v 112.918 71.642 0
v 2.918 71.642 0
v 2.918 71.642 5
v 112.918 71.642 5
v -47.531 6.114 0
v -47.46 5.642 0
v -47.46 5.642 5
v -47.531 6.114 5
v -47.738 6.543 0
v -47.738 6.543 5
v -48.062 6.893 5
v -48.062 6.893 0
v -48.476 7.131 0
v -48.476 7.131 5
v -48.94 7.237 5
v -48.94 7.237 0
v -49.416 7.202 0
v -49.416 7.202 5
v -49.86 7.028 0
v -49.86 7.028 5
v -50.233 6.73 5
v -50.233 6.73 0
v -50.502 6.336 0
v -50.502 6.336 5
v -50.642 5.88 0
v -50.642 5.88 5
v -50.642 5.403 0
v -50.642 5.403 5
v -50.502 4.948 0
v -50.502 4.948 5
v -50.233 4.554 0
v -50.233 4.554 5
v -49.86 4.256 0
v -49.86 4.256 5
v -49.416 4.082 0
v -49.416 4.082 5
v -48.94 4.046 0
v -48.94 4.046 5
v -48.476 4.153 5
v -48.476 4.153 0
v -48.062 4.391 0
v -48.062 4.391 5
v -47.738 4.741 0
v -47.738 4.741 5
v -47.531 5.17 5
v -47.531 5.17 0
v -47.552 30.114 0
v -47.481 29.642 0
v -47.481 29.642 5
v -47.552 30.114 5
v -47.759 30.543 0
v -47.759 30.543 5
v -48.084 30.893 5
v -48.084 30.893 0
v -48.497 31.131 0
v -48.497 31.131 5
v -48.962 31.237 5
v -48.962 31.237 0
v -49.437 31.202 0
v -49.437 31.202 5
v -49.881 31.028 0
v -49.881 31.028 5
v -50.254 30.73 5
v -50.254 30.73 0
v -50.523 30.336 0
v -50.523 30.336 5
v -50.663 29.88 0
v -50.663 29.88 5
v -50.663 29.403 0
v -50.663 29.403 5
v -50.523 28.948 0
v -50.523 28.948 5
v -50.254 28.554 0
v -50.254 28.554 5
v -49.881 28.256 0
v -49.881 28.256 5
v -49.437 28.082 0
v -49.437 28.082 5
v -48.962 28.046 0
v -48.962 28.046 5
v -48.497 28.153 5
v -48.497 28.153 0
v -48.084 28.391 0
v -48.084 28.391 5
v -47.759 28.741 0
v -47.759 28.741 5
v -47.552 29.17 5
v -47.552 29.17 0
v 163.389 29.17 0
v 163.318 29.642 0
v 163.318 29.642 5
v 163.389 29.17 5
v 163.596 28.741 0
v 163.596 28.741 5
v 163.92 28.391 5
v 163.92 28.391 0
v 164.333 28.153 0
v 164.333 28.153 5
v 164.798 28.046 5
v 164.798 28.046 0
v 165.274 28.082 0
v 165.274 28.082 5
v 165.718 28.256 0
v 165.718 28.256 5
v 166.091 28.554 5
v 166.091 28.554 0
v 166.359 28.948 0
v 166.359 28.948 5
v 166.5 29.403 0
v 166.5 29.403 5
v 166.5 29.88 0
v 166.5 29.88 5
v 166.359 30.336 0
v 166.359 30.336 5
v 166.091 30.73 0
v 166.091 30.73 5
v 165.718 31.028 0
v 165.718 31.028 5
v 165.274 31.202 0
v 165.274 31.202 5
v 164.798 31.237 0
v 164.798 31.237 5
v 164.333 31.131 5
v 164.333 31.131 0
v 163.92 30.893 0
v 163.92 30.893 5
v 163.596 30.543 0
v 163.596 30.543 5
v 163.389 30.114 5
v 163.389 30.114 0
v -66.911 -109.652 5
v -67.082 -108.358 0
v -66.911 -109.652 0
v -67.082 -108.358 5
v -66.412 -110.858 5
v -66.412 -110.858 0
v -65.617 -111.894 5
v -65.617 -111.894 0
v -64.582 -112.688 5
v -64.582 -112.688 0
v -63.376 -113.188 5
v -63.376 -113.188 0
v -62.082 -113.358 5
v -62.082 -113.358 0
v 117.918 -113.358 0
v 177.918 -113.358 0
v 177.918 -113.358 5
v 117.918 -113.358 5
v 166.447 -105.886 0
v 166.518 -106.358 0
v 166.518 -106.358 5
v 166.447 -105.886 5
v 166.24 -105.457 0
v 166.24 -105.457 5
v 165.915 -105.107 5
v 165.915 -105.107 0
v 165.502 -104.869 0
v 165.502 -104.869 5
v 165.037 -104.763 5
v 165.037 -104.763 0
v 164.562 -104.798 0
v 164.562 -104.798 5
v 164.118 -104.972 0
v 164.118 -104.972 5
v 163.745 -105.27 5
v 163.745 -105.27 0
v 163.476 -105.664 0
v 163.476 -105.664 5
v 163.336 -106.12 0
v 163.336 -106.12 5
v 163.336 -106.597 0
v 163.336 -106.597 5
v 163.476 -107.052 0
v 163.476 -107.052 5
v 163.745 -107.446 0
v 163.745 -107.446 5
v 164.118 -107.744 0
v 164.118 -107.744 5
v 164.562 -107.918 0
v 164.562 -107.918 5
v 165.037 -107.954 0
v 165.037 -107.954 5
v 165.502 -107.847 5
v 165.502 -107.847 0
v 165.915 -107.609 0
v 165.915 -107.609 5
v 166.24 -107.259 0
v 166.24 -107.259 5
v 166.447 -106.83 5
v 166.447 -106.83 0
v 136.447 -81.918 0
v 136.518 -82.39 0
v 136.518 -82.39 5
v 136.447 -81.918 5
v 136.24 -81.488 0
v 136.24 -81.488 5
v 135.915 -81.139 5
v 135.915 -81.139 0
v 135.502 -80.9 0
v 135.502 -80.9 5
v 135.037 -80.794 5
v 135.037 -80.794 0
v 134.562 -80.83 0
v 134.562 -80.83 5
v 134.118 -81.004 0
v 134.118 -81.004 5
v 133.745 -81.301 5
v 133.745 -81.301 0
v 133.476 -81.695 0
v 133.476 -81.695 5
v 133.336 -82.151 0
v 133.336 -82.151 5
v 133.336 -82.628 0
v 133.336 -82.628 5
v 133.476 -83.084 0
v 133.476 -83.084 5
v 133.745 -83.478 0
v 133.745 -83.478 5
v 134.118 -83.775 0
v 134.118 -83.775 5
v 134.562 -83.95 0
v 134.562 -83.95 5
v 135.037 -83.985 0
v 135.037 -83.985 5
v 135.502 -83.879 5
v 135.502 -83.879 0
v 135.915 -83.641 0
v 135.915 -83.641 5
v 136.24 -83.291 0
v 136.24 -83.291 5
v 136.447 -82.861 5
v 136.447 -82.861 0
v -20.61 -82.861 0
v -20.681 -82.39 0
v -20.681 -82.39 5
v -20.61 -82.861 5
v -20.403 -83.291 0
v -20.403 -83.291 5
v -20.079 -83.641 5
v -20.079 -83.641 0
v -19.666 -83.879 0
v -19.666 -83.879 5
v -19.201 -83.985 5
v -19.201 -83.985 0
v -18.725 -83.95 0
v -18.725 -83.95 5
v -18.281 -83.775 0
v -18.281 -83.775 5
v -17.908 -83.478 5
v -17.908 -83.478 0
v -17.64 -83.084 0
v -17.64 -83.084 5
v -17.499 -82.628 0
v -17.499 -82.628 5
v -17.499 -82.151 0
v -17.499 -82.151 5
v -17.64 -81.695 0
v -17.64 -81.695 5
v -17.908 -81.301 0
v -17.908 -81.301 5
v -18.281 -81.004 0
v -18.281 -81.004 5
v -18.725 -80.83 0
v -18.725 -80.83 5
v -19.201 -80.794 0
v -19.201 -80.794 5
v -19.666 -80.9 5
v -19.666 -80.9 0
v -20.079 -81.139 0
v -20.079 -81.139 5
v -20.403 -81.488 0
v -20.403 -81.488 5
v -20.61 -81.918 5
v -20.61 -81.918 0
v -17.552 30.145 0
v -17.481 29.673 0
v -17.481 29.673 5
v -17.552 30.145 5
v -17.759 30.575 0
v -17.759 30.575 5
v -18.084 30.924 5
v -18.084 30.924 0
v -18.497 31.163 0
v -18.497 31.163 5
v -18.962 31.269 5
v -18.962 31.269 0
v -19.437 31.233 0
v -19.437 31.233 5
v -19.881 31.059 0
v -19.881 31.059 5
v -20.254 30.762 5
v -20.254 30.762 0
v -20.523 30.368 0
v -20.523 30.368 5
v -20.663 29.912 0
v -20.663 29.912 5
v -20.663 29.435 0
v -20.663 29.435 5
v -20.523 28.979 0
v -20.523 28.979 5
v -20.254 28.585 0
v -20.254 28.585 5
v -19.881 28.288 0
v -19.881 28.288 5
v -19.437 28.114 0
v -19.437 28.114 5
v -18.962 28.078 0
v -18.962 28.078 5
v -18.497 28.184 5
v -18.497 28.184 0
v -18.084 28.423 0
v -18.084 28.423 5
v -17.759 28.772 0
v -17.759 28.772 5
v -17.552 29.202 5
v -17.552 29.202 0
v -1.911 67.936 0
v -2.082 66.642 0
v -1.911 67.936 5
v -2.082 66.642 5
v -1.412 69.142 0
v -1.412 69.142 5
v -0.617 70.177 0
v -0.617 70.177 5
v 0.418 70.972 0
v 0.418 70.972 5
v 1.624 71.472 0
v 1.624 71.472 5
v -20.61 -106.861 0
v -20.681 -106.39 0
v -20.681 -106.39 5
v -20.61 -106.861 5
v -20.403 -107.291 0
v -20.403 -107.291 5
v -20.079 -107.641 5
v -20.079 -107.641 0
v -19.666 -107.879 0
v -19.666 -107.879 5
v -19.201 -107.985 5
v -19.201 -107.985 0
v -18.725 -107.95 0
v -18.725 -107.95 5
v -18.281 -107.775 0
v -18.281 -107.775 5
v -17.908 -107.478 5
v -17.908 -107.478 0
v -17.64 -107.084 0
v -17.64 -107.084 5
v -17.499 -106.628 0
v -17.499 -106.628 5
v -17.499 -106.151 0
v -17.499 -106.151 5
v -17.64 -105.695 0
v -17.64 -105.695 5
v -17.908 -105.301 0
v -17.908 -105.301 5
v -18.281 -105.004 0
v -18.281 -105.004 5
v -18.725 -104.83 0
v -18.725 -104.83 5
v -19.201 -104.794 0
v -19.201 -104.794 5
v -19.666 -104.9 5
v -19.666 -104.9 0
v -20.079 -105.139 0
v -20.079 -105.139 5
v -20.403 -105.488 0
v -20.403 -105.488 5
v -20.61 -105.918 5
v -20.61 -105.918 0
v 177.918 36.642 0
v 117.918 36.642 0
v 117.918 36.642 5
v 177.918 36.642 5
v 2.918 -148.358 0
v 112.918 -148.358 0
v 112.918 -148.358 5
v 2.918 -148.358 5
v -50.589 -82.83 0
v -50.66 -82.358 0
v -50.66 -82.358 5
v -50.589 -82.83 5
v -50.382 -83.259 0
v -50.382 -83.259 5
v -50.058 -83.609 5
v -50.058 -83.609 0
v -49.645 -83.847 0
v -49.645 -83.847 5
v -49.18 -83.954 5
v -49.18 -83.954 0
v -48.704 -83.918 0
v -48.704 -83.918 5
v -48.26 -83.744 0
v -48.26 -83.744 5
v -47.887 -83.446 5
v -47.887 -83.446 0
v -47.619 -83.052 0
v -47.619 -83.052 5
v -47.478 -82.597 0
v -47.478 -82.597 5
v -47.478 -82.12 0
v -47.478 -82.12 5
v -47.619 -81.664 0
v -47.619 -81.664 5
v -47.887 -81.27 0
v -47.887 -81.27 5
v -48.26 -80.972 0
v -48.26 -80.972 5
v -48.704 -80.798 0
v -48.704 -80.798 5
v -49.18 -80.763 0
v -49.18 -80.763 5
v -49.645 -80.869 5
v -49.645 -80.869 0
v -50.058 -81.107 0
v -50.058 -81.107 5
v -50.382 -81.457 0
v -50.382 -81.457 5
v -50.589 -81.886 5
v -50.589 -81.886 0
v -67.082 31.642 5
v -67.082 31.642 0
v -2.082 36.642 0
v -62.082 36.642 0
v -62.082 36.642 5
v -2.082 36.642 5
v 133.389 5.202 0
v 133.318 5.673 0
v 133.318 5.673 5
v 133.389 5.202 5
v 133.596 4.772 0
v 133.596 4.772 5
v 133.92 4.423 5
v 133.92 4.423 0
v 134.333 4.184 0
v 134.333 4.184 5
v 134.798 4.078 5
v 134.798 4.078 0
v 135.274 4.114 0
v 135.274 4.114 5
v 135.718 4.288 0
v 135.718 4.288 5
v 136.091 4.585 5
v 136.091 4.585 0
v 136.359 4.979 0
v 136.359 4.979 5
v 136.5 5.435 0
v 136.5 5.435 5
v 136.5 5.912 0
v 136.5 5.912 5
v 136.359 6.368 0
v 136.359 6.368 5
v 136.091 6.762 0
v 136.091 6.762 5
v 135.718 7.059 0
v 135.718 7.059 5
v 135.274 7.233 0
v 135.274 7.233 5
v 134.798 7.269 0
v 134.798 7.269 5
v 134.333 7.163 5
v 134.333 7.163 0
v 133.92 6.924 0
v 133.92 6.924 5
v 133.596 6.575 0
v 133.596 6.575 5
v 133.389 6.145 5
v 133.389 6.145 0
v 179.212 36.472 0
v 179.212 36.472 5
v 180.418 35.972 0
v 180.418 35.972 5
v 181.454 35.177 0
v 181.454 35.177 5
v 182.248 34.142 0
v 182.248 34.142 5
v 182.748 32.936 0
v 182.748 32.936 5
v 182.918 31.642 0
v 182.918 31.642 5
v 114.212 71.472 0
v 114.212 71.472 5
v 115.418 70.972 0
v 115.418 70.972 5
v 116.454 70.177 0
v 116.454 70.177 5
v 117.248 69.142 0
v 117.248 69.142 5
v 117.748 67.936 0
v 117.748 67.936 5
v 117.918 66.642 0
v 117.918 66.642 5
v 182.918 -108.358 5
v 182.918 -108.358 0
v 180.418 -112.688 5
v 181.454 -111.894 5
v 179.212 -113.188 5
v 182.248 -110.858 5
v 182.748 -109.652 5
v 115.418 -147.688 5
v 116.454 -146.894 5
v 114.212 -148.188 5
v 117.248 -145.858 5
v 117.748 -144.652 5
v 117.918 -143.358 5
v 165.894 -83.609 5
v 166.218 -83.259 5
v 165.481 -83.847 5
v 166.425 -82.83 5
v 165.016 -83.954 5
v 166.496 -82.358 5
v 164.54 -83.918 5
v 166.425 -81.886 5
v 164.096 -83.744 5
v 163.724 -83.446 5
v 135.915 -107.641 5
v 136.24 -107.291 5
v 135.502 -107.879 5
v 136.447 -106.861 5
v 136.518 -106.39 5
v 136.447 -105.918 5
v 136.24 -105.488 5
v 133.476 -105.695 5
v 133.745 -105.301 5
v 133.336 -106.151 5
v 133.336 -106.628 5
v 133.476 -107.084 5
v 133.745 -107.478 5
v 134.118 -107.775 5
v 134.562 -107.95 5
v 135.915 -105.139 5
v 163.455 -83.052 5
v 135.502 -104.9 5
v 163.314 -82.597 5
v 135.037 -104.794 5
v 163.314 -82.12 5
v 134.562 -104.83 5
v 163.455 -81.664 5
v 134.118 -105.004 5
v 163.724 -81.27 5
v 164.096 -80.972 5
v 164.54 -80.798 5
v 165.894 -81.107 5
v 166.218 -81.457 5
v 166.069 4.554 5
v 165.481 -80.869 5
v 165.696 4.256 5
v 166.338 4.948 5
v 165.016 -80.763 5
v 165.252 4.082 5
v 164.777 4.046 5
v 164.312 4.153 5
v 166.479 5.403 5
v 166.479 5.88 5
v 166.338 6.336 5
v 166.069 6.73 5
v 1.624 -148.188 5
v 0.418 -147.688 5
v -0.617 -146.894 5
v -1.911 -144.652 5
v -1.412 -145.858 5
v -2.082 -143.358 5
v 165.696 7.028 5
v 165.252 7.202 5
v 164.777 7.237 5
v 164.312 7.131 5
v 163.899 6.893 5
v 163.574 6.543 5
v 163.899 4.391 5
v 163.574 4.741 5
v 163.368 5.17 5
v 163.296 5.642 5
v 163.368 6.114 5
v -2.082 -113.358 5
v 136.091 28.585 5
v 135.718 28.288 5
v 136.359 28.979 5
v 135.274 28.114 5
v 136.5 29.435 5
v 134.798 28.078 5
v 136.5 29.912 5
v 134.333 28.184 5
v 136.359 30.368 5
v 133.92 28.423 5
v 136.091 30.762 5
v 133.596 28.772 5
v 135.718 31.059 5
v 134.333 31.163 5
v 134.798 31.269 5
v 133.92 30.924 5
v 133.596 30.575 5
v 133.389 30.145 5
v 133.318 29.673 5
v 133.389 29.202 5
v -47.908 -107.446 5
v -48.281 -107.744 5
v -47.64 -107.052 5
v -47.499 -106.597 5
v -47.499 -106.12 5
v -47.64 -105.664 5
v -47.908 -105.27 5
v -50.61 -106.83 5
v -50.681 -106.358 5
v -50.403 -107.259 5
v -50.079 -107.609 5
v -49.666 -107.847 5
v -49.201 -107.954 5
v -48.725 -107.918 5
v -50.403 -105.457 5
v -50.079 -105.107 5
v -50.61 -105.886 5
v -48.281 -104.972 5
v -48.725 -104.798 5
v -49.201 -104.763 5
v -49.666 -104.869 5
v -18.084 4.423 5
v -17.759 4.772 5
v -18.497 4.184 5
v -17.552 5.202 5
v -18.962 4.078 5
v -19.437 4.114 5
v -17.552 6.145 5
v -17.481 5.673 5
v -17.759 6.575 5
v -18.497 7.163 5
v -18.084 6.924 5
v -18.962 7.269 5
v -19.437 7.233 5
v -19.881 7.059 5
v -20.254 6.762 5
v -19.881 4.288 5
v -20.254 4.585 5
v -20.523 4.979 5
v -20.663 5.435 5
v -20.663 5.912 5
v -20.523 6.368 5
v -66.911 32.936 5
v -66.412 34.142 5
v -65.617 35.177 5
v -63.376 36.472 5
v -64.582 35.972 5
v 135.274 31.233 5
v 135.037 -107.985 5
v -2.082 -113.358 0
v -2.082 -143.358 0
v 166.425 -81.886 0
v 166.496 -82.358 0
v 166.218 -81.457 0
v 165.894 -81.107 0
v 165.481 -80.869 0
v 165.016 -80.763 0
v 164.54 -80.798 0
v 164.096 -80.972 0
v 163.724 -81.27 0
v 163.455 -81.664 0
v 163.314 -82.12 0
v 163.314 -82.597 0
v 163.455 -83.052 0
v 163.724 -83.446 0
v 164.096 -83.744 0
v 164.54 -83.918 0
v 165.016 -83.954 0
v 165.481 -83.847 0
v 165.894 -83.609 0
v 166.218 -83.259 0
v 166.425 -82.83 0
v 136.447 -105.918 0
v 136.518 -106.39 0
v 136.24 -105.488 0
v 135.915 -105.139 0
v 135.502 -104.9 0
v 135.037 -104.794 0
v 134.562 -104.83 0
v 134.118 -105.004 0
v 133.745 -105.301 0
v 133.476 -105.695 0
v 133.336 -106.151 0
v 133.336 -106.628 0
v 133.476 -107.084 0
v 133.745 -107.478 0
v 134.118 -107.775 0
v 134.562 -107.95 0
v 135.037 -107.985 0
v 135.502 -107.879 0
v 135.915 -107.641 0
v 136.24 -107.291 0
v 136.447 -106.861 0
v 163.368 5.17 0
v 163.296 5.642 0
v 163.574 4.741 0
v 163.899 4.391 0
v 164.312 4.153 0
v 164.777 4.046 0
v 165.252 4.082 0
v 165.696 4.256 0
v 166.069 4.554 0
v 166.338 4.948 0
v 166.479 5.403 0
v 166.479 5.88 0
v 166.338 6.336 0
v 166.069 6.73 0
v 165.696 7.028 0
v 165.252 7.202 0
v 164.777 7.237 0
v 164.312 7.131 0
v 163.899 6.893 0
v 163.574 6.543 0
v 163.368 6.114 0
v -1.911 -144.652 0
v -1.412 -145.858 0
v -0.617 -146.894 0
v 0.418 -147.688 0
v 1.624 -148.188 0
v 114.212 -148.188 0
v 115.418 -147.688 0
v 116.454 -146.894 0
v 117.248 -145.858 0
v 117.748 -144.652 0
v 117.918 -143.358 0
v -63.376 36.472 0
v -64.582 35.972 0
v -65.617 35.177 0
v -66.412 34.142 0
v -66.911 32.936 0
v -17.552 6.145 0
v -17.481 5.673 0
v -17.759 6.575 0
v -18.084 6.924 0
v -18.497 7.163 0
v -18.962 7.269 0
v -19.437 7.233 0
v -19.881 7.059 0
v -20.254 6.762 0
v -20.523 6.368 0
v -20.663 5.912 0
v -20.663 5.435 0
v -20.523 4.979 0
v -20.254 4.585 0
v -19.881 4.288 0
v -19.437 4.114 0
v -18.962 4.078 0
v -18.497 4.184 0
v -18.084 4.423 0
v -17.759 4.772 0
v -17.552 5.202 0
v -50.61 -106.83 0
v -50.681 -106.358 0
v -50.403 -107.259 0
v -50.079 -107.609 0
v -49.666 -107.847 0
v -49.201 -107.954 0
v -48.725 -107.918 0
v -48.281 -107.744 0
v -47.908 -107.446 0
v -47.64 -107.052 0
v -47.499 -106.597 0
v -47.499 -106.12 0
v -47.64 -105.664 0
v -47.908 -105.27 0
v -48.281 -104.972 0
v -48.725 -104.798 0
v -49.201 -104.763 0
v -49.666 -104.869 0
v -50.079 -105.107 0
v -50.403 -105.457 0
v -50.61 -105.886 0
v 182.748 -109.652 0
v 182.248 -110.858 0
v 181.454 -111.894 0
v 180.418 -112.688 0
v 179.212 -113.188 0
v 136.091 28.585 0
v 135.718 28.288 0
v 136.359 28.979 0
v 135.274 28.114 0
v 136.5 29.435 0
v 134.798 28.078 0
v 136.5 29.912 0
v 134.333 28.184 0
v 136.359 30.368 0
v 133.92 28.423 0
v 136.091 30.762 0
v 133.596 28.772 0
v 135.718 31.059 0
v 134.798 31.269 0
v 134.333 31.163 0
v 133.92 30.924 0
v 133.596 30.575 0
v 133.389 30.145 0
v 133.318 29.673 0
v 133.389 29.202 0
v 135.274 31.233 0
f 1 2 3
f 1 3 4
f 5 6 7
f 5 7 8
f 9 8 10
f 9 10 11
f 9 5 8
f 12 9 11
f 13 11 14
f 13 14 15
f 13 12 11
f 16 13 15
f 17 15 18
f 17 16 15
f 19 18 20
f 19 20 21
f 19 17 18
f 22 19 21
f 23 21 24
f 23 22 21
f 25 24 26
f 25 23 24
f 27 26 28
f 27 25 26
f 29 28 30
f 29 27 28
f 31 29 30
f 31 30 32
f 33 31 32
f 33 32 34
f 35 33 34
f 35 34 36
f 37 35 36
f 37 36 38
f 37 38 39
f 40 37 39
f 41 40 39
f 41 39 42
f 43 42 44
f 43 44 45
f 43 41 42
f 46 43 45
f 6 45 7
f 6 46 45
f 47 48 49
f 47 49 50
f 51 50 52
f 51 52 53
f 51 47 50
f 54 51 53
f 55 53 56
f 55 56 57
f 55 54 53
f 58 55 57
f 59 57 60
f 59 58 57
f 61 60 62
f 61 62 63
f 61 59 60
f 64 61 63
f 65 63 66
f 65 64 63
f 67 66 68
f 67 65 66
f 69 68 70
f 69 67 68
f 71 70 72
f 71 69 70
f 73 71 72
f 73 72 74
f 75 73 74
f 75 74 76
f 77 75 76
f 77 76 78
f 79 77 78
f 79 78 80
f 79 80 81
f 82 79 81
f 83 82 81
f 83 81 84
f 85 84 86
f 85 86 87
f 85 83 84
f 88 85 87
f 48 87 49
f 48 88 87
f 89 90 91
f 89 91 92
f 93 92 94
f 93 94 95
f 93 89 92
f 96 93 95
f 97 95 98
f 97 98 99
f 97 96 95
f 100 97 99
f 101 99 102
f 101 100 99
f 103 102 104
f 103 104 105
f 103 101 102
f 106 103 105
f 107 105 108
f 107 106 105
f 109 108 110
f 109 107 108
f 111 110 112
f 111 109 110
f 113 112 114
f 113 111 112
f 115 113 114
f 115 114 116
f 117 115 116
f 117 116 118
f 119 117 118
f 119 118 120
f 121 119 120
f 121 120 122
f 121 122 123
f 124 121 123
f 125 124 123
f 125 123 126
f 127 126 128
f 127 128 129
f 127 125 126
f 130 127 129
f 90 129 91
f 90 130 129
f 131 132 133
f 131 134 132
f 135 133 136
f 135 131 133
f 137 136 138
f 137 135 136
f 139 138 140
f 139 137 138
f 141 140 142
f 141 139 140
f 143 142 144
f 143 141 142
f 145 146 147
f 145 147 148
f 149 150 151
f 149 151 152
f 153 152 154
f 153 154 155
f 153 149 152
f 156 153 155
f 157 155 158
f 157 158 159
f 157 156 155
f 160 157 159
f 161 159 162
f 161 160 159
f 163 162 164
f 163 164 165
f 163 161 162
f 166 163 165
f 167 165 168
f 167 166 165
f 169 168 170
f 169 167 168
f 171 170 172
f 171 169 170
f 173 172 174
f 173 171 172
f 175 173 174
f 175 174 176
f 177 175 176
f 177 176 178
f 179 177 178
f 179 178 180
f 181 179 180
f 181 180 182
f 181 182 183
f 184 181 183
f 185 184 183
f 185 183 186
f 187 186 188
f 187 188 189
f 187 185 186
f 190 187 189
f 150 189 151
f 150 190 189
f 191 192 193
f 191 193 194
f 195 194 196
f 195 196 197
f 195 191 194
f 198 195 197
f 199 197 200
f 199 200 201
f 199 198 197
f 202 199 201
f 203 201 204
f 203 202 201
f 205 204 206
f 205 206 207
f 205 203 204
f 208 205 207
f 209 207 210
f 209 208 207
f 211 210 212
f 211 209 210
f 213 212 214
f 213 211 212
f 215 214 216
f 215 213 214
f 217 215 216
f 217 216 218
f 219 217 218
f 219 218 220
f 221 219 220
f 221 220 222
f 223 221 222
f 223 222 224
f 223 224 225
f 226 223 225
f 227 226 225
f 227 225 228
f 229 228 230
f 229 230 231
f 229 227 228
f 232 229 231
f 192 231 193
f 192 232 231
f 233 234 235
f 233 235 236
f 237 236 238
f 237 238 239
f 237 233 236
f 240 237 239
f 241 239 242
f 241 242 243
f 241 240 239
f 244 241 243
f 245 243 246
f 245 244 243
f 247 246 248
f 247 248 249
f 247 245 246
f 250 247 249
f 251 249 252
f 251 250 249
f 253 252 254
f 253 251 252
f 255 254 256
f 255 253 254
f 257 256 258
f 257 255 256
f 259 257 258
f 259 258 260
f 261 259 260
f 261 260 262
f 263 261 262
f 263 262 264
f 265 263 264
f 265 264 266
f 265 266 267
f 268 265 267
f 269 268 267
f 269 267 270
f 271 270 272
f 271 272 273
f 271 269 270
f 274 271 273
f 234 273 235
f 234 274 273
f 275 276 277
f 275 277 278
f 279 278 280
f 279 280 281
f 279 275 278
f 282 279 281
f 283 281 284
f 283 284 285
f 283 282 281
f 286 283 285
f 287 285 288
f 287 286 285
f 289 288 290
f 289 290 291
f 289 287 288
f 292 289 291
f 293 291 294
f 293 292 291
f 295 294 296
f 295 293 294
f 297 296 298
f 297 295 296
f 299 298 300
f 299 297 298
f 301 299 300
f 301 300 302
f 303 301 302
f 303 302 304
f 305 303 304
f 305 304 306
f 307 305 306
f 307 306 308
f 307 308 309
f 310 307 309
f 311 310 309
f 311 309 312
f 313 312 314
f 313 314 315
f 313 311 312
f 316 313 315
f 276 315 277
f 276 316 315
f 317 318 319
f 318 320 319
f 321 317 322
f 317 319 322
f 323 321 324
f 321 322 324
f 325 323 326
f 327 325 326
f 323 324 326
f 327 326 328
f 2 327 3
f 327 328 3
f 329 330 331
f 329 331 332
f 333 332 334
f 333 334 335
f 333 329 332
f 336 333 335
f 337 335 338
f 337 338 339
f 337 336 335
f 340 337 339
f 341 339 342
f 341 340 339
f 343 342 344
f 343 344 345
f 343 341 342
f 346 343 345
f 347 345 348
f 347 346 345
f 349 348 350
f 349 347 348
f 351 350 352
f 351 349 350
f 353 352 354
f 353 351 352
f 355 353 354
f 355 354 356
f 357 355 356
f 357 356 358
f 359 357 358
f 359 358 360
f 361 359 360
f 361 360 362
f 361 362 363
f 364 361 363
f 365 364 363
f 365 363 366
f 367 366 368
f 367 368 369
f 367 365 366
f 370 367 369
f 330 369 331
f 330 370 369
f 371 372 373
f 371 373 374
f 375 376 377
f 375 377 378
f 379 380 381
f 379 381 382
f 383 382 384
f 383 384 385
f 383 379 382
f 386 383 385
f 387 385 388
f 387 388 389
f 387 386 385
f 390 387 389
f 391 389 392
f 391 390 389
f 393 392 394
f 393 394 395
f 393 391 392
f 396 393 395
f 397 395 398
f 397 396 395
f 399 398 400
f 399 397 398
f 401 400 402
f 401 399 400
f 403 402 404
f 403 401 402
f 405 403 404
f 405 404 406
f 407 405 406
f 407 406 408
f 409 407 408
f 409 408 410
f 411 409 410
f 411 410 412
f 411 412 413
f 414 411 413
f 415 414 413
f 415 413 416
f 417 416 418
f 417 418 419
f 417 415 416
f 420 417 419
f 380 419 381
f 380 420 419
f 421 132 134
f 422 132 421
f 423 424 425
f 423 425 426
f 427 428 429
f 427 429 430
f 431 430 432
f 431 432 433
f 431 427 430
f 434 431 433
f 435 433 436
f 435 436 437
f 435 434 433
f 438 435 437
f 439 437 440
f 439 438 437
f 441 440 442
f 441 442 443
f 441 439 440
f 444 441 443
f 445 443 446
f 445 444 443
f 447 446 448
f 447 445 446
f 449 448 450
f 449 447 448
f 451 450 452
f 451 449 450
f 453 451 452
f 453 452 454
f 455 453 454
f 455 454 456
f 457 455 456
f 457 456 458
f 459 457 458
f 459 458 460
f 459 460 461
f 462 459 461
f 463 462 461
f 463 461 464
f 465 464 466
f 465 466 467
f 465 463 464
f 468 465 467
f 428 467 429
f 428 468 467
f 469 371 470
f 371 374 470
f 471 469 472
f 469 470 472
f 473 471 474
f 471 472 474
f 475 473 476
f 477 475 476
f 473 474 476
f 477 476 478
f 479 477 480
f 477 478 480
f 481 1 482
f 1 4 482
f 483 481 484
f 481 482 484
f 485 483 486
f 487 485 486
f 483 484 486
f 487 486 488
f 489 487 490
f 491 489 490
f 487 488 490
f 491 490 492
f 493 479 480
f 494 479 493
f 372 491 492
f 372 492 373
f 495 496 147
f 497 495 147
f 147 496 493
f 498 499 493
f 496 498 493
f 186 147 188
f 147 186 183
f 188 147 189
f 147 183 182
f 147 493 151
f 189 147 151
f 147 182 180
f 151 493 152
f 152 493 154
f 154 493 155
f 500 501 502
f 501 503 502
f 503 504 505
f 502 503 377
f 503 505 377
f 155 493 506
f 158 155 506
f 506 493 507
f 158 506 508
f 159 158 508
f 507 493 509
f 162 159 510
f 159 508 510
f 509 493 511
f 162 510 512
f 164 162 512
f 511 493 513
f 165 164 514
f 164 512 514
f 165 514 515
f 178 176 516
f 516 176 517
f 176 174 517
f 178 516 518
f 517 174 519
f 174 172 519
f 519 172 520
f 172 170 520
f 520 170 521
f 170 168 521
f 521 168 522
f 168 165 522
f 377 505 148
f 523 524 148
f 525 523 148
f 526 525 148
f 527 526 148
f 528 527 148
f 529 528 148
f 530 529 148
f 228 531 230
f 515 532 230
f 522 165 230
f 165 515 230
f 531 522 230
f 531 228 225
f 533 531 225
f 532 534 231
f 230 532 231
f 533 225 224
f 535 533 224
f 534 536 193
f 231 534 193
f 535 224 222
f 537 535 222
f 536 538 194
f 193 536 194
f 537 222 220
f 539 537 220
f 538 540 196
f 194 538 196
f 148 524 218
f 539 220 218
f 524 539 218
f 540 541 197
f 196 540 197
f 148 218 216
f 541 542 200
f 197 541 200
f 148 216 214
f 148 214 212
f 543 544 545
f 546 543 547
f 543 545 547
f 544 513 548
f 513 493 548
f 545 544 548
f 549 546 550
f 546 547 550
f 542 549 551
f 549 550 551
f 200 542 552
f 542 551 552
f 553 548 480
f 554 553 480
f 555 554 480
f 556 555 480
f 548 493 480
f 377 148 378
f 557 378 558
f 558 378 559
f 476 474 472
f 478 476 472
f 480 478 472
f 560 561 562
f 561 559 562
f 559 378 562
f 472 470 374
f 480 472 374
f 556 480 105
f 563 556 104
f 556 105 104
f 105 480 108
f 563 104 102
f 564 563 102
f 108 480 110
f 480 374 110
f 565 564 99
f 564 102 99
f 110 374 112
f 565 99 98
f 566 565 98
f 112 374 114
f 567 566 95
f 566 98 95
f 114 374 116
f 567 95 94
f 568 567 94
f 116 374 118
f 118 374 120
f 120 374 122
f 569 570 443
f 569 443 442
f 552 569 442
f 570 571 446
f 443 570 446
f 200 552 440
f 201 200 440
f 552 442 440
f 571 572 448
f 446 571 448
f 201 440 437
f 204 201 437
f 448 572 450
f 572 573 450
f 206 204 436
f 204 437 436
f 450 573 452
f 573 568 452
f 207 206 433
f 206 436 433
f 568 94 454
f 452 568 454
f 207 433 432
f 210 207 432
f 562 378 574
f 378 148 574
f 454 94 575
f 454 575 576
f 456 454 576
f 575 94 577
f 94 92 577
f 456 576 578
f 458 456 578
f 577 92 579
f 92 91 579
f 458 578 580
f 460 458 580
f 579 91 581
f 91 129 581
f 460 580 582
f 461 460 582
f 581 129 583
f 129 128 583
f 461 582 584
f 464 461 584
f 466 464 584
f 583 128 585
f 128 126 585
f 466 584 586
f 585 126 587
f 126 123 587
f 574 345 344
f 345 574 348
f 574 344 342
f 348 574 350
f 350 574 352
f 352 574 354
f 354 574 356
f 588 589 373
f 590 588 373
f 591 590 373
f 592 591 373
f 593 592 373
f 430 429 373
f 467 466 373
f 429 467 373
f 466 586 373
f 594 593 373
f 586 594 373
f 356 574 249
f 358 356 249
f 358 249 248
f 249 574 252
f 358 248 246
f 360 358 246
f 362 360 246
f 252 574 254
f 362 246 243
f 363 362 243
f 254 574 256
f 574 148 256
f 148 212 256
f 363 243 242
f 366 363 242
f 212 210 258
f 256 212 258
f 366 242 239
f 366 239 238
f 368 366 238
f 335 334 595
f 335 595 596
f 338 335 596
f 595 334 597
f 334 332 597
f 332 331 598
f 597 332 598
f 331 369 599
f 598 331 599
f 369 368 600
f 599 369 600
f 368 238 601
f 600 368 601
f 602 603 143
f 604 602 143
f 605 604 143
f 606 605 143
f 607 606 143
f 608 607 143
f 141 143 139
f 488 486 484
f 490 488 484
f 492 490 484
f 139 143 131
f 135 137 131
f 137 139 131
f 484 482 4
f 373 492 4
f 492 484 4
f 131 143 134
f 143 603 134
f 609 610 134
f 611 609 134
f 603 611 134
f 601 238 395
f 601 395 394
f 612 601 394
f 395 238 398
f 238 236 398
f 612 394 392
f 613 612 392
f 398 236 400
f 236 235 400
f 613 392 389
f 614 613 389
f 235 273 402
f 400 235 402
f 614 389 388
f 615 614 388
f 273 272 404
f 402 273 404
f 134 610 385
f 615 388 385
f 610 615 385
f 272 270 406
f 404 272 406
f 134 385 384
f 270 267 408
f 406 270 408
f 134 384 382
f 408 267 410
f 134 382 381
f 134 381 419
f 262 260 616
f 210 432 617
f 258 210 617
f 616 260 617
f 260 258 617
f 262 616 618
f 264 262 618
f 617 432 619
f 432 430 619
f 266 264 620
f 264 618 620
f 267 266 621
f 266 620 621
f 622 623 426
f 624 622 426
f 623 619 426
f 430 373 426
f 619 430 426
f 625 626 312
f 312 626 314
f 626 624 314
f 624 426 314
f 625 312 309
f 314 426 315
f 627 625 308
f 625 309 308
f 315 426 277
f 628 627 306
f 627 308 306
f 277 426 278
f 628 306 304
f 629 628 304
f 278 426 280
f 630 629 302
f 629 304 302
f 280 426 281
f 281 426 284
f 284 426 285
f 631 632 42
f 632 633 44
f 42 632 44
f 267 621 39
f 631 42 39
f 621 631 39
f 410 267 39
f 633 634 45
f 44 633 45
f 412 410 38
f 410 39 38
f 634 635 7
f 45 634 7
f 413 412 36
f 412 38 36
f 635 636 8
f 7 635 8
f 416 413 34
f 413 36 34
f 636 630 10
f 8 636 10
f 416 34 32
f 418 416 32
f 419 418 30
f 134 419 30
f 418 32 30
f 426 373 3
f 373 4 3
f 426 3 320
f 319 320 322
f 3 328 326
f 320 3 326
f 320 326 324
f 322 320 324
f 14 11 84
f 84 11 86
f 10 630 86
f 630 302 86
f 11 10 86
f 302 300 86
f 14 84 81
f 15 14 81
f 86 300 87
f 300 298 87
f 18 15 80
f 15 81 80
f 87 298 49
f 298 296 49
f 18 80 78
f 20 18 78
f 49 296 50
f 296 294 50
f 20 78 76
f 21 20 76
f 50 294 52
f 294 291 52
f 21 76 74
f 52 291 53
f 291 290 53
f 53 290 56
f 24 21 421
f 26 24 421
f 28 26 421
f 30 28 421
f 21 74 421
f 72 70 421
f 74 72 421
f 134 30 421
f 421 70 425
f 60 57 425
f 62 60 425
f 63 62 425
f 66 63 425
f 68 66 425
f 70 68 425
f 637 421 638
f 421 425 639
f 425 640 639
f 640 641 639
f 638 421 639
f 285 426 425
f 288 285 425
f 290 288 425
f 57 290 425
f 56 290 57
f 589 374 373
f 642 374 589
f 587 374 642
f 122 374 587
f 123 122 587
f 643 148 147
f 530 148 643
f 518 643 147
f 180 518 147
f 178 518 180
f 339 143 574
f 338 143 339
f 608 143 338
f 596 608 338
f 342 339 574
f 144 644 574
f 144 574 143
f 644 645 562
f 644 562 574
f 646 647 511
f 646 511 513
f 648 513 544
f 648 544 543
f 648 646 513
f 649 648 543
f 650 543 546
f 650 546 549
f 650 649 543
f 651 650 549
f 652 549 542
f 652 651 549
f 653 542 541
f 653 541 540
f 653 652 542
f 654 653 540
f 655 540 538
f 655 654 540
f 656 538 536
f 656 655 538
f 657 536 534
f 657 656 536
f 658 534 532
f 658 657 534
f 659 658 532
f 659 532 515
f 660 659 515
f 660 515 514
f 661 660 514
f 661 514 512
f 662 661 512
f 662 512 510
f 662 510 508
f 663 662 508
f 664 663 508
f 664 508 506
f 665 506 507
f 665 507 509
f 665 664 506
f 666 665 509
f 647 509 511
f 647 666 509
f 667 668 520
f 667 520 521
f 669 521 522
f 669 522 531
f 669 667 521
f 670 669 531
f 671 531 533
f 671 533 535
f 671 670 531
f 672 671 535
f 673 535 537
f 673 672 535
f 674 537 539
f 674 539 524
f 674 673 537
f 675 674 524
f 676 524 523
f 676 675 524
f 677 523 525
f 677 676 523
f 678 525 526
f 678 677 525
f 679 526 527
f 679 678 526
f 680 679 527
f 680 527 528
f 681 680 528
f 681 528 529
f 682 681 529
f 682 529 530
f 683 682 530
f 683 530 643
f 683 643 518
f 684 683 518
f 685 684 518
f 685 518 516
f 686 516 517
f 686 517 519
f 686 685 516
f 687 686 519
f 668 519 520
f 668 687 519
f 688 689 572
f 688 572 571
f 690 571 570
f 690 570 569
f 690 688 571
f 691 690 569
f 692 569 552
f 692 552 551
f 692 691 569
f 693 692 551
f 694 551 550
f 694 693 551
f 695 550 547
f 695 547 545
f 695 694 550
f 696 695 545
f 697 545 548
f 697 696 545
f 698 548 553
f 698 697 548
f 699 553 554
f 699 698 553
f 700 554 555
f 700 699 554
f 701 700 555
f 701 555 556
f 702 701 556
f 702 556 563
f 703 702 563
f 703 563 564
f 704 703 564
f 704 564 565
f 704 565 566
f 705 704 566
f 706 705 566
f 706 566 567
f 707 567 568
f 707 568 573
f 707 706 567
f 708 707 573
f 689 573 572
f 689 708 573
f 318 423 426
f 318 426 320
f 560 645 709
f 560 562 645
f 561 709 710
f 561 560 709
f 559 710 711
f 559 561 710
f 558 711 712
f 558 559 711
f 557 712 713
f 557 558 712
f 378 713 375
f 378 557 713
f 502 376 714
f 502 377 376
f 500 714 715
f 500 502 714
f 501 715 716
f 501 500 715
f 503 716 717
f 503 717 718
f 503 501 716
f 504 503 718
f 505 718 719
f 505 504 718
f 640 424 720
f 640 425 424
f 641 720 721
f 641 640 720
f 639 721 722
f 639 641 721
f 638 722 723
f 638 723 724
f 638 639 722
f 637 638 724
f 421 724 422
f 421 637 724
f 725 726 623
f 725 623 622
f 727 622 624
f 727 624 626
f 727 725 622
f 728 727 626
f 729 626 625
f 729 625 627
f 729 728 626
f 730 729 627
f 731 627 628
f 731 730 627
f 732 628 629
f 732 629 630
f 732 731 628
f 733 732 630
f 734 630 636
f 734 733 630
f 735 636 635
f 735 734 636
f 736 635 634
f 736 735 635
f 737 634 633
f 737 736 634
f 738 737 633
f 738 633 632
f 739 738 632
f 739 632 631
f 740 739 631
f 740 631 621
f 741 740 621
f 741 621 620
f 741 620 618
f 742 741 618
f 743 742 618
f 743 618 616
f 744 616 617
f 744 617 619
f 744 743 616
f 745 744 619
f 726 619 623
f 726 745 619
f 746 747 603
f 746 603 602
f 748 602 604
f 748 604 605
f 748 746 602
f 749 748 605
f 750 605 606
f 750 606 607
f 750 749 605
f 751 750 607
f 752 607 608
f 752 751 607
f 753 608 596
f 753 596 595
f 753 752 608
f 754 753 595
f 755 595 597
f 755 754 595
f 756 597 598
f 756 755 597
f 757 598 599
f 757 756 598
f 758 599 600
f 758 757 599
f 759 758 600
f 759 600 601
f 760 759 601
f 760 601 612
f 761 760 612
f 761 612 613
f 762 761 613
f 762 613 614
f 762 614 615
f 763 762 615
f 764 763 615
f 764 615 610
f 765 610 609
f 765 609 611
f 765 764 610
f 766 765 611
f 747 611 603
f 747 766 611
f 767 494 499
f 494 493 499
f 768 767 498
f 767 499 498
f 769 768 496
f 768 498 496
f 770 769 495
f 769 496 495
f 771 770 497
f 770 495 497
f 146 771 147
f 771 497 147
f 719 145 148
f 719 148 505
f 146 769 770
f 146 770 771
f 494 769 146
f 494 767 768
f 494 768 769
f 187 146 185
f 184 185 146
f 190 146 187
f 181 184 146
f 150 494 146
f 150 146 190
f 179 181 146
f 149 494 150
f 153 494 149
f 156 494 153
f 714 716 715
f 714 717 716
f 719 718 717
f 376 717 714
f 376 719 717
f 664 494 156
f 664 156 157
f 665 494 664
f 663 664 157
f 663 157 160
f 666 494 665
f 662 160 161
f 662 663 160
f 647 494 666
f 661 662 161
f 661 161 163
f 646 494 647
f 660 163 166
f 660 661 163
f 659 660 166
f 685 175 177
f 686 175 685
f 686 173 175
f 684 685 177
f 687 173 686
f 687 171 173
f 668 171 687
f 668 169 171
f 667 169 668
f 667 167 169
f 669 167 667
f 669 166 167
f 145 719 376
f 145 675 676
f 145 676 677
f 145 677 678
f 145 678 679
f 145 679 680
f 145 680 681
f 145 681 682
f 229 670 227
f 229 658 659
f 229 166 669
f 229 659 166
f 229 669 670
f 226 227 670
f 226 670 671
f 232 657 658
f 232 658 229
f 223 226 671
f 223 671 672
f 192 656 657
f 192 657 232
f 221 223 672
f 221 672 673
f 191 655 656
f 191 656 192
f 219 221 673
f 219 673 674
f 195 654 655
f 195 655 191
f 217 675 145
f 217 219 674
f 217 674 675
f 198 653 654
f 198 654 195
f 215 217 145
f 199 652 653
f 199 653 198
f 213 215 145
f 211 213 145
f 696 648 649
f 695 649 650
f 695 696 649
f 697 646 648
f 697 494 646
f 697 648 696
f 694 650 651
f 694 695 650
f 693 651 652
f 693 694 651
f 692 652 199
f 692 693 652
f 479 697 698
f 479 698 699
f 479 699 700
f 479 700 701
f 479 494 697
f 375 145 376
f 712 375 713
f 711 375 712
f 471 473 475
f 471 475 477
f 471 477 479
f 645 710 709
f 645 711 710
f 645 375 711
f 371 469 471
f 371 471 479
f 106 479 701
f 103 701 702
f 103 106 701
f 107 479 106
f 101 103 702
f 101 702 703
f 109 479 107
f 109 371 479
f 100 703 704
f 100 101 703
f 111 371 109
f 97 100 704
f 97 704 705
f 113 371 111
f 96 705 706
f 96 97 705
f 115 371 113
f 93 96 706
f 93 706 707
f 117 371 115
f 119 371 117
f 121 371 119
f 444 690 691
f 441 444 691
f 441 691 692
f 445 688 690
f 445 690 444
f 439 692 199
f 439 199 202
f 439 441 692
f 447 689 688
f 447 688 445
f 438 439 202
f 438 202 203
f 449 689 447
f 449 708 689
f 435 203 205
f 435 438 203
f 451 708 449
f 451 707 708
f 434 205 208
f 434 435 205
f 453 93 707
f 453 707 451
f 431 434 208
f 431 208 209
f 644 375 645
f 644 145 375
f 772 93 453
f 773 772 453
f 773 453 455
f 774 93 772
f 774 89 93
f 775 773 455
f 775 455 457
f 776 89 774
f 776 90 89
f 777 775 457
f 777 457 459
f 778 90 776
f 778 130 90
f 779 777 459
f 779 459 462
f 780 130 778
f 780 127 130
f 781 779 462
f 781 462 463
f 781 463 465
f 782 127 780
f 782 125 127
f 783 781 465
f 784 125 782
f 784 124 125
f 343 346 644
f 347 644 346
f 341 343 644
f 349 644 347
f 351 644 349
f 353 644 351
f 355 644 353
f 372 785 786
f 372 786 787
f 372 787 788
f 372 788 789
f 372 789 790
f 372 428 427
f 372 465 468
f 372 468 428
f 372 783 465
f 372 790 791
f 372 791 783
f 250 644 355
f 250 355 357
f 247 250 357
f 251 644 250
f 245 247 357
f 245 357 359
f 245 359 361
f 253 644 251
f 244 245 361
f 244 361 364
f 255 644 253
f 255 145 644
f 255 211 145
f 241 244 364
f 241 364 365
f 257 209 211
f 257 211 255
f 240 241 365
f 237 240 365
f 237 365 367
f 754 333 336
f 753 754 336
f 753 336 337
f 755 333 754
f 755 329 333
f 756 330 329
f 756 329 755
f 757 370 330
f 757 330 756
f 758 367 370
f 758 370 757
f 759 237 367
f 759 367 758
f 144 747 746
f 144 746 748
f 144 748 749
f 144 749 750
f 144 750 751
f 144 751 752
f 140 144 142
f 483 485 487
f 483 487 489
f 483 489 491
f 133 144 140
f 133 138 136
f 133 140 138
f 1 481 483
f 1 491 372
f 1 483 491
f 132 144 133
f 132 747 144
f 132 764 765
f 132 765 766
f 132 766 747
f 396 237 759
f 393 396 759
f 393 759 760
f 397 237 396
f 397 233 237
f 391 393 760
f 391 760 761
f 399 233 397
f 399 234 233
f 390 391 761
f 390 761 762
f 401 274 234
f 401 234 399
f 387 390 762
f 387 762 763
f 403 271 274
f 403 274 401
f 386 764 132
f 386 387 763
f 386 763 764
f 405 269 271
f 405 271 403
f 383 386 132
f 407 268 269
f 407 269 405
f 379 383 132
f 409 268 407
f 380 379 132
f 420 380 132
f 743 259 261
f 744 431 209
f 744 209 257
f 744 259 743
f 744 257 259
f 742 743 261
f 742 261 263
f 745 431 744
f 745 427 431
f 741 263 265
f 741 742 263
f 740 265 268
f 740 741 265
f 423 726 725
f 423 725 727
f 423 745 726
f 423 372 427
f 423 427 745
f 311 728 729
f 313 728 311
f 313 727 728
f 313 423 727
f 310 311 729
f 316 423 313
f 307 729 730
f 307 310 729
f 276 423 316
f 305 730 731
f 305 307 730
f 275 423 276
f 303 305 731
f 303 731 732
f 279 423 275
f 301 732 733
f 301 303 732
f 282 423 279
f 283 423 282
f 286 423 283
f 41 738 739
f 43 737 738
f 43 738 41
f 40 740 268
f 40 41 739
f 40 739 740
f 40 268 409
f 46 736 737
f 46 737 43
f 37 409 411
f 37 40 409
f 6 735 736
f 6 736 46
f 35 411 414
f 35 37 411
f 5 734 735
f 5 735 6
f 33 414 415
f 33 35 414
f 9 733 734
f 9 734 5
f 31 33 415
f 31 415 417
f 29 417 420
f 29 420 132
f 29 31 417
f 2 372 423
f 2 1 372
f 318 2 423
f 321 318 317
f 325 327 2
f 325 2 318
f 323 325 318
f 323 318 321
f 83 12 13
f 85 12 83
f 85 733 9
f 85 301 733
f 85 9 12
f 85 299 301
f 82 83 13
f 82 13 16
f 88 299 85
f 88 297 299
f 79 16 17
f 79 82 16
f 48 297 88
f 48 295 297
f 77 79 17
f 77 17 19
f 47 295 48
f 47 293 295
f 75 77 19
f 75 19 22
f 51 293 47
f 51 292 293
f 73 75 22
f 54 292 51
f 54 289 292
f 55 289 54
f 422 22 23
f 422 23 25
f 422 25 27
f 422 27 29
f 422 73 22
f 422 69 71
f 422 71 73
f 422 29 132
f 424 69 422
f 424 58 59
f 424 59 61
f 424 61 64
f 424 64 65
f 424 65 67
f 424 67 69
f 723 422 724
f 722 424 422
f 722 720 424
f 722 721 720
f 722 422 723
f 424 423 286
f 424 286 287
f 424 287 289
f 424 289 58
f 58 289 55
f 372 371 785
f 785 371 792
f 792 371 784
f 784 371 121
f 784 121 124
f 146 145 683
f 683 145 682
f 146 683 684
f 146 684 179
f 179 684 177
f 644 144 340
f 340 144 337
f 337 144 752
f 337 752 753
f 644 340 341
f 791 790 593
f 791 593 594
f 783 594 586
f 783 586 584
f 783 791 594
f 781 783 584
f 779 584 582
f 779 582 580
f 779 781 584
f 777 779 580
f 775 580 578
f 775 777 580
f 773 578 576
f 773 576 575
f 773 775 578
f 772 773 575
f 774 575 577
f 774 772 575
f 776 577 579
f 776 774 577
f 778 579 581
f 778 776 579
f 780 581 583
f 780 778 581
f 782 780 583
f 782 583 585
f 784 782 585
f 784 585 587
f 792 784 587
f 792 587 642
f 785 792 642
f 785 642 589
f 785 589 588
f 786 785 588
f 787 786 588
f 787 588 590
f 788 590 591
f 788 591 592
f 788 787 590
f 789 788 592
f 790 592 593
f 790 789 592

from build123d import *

# Parameters (mm, degrees)
SKETCH_1_R      = 1.6
EXTRUDE_1_DEPTH = 5
FILLET_1_R      = 5


with BuildPart() as part:
    # 草图1 → 凸台-拉伸1 (new body)
    with BuildSketch(Plane.XY):
        Polygon((-67.081805701, 36.641915025), (-2.081805701, 36.641915025), (-2.081805701, 71.641915025), (117.918194299, 71.641915025), (117.918194299, 36.641915025), (182.918194299, 36.641915025), (182.918194299, -113.358084975), (117.918194299, -113.358084975), (117.918194299, -148.358084975), (-2.081805701, -148.358084975), (-2.081805701, -113.358084975), (-67.081805701, -113.358084975), align=None)
        with Locations((-49.081283258, 29.641915025)):
            Circle(SKETCH_1_R, mode=Mode.SUBTRACT)
        with Locations((-19.081283258, 29.673445995)):
            Circle(SKETCH_1_R, mode=Mode.SUBTRACT)
        with Locations((-49.060066678, 5.641915025)):
            Circle(SKETCH_1_R, mode=Mode.SUBTRACT)
        with Locations((-19.081283258, 5.673445995)):
            Circle(SKETCH_1_R, mode=Mode.SUBTRACT)
        with Locations(Location((164.896455276, 5.641915025, 0), (0, 0, 180))):
            Circle(SKETCH_1_R, mode=Mode.SUBTRACT)
        with Locations(Location((134.917671856, 5.673445995, 0), (0, 0, 180))):
            Circle(SKETCH_1_R, mode=Mode.SUBTRACT)
        with Locations(Location((134.917671856, 29.673445995, 0), (0, 0, 180))):
            Circle(SKETCH_1_R, mode=Mode.SUBTRACT)
        with Locations(Location((164.917671856, 29.641915025, 0), (0, 0, 180))):
            Circle(SKETCH_1_R, mode=Mode.SUBTRACT)
        with Locations((134.917671856, -82.389615946)):
            Circle(SKETCH_1_R, mode=Mode.SUBTRACT)
        with Locations((164.896455276, -82.358084975)):
            Circle(SKETCH_1_R, mode=Mode.SUBTRACT)
        with Locations((164.917671856, -106.358084975)):
            Circle(SKETCH_1_R, mode=Mode.SUBTRACT)
        with Locations((134.917671856, -106.389615946)):
            Circle(SKETCH_1_R, mode=Mode.SUBTRACT)
        with Locations(Location((-49.060066678, -82.358084975, 0), (0, 0, 180))):
            Circle(SKETCH_1_R, mode=Mode.SUBTRACT)
        with Locations(Location((-19.081283258, -82.389615946, 0), (0, 0, 180))):
            Circle(SKETCH_1_R, mode=Mode.SUBTRACT)
        with Locations(Location((-19.081283258, -106.389615946, 0), (0, 0, 180))):
            Circle(SKETCH_1_R, mode=Mode.SUBTRACT)
        with Locations(Location((-49.081283258, -106.358084975, 0), (0, 0, 180))):
            Circle(SKETCH_1_R, mode=Mode.SUBTRACT)
    extrude(amount=EXTRUDE_1_DEPTH)

    # 圆角1
    fillet_1_edges = [part.edges().sort_by_distance(p)[0] for p in [
        (-67.081805701, 36.641915025, 2.5),
        (-2.081805701, 71.641915025, 2.5),
        (117.918194299, 71.641915025, 2.5),
        (182.918194299, 36.641915025, 2.5),
        (182.918194299, -113.358084975, 2.5),
        (117.918194299, -148.358084975, 2.5),
        (-2.081805701, -148.358084975, 2.5),
        (-67.081805701, -113.358084975, 2.5),
    ]]
    fillet(fillet_1_edges, radius=FILLET_1_R)


solid = part.part
